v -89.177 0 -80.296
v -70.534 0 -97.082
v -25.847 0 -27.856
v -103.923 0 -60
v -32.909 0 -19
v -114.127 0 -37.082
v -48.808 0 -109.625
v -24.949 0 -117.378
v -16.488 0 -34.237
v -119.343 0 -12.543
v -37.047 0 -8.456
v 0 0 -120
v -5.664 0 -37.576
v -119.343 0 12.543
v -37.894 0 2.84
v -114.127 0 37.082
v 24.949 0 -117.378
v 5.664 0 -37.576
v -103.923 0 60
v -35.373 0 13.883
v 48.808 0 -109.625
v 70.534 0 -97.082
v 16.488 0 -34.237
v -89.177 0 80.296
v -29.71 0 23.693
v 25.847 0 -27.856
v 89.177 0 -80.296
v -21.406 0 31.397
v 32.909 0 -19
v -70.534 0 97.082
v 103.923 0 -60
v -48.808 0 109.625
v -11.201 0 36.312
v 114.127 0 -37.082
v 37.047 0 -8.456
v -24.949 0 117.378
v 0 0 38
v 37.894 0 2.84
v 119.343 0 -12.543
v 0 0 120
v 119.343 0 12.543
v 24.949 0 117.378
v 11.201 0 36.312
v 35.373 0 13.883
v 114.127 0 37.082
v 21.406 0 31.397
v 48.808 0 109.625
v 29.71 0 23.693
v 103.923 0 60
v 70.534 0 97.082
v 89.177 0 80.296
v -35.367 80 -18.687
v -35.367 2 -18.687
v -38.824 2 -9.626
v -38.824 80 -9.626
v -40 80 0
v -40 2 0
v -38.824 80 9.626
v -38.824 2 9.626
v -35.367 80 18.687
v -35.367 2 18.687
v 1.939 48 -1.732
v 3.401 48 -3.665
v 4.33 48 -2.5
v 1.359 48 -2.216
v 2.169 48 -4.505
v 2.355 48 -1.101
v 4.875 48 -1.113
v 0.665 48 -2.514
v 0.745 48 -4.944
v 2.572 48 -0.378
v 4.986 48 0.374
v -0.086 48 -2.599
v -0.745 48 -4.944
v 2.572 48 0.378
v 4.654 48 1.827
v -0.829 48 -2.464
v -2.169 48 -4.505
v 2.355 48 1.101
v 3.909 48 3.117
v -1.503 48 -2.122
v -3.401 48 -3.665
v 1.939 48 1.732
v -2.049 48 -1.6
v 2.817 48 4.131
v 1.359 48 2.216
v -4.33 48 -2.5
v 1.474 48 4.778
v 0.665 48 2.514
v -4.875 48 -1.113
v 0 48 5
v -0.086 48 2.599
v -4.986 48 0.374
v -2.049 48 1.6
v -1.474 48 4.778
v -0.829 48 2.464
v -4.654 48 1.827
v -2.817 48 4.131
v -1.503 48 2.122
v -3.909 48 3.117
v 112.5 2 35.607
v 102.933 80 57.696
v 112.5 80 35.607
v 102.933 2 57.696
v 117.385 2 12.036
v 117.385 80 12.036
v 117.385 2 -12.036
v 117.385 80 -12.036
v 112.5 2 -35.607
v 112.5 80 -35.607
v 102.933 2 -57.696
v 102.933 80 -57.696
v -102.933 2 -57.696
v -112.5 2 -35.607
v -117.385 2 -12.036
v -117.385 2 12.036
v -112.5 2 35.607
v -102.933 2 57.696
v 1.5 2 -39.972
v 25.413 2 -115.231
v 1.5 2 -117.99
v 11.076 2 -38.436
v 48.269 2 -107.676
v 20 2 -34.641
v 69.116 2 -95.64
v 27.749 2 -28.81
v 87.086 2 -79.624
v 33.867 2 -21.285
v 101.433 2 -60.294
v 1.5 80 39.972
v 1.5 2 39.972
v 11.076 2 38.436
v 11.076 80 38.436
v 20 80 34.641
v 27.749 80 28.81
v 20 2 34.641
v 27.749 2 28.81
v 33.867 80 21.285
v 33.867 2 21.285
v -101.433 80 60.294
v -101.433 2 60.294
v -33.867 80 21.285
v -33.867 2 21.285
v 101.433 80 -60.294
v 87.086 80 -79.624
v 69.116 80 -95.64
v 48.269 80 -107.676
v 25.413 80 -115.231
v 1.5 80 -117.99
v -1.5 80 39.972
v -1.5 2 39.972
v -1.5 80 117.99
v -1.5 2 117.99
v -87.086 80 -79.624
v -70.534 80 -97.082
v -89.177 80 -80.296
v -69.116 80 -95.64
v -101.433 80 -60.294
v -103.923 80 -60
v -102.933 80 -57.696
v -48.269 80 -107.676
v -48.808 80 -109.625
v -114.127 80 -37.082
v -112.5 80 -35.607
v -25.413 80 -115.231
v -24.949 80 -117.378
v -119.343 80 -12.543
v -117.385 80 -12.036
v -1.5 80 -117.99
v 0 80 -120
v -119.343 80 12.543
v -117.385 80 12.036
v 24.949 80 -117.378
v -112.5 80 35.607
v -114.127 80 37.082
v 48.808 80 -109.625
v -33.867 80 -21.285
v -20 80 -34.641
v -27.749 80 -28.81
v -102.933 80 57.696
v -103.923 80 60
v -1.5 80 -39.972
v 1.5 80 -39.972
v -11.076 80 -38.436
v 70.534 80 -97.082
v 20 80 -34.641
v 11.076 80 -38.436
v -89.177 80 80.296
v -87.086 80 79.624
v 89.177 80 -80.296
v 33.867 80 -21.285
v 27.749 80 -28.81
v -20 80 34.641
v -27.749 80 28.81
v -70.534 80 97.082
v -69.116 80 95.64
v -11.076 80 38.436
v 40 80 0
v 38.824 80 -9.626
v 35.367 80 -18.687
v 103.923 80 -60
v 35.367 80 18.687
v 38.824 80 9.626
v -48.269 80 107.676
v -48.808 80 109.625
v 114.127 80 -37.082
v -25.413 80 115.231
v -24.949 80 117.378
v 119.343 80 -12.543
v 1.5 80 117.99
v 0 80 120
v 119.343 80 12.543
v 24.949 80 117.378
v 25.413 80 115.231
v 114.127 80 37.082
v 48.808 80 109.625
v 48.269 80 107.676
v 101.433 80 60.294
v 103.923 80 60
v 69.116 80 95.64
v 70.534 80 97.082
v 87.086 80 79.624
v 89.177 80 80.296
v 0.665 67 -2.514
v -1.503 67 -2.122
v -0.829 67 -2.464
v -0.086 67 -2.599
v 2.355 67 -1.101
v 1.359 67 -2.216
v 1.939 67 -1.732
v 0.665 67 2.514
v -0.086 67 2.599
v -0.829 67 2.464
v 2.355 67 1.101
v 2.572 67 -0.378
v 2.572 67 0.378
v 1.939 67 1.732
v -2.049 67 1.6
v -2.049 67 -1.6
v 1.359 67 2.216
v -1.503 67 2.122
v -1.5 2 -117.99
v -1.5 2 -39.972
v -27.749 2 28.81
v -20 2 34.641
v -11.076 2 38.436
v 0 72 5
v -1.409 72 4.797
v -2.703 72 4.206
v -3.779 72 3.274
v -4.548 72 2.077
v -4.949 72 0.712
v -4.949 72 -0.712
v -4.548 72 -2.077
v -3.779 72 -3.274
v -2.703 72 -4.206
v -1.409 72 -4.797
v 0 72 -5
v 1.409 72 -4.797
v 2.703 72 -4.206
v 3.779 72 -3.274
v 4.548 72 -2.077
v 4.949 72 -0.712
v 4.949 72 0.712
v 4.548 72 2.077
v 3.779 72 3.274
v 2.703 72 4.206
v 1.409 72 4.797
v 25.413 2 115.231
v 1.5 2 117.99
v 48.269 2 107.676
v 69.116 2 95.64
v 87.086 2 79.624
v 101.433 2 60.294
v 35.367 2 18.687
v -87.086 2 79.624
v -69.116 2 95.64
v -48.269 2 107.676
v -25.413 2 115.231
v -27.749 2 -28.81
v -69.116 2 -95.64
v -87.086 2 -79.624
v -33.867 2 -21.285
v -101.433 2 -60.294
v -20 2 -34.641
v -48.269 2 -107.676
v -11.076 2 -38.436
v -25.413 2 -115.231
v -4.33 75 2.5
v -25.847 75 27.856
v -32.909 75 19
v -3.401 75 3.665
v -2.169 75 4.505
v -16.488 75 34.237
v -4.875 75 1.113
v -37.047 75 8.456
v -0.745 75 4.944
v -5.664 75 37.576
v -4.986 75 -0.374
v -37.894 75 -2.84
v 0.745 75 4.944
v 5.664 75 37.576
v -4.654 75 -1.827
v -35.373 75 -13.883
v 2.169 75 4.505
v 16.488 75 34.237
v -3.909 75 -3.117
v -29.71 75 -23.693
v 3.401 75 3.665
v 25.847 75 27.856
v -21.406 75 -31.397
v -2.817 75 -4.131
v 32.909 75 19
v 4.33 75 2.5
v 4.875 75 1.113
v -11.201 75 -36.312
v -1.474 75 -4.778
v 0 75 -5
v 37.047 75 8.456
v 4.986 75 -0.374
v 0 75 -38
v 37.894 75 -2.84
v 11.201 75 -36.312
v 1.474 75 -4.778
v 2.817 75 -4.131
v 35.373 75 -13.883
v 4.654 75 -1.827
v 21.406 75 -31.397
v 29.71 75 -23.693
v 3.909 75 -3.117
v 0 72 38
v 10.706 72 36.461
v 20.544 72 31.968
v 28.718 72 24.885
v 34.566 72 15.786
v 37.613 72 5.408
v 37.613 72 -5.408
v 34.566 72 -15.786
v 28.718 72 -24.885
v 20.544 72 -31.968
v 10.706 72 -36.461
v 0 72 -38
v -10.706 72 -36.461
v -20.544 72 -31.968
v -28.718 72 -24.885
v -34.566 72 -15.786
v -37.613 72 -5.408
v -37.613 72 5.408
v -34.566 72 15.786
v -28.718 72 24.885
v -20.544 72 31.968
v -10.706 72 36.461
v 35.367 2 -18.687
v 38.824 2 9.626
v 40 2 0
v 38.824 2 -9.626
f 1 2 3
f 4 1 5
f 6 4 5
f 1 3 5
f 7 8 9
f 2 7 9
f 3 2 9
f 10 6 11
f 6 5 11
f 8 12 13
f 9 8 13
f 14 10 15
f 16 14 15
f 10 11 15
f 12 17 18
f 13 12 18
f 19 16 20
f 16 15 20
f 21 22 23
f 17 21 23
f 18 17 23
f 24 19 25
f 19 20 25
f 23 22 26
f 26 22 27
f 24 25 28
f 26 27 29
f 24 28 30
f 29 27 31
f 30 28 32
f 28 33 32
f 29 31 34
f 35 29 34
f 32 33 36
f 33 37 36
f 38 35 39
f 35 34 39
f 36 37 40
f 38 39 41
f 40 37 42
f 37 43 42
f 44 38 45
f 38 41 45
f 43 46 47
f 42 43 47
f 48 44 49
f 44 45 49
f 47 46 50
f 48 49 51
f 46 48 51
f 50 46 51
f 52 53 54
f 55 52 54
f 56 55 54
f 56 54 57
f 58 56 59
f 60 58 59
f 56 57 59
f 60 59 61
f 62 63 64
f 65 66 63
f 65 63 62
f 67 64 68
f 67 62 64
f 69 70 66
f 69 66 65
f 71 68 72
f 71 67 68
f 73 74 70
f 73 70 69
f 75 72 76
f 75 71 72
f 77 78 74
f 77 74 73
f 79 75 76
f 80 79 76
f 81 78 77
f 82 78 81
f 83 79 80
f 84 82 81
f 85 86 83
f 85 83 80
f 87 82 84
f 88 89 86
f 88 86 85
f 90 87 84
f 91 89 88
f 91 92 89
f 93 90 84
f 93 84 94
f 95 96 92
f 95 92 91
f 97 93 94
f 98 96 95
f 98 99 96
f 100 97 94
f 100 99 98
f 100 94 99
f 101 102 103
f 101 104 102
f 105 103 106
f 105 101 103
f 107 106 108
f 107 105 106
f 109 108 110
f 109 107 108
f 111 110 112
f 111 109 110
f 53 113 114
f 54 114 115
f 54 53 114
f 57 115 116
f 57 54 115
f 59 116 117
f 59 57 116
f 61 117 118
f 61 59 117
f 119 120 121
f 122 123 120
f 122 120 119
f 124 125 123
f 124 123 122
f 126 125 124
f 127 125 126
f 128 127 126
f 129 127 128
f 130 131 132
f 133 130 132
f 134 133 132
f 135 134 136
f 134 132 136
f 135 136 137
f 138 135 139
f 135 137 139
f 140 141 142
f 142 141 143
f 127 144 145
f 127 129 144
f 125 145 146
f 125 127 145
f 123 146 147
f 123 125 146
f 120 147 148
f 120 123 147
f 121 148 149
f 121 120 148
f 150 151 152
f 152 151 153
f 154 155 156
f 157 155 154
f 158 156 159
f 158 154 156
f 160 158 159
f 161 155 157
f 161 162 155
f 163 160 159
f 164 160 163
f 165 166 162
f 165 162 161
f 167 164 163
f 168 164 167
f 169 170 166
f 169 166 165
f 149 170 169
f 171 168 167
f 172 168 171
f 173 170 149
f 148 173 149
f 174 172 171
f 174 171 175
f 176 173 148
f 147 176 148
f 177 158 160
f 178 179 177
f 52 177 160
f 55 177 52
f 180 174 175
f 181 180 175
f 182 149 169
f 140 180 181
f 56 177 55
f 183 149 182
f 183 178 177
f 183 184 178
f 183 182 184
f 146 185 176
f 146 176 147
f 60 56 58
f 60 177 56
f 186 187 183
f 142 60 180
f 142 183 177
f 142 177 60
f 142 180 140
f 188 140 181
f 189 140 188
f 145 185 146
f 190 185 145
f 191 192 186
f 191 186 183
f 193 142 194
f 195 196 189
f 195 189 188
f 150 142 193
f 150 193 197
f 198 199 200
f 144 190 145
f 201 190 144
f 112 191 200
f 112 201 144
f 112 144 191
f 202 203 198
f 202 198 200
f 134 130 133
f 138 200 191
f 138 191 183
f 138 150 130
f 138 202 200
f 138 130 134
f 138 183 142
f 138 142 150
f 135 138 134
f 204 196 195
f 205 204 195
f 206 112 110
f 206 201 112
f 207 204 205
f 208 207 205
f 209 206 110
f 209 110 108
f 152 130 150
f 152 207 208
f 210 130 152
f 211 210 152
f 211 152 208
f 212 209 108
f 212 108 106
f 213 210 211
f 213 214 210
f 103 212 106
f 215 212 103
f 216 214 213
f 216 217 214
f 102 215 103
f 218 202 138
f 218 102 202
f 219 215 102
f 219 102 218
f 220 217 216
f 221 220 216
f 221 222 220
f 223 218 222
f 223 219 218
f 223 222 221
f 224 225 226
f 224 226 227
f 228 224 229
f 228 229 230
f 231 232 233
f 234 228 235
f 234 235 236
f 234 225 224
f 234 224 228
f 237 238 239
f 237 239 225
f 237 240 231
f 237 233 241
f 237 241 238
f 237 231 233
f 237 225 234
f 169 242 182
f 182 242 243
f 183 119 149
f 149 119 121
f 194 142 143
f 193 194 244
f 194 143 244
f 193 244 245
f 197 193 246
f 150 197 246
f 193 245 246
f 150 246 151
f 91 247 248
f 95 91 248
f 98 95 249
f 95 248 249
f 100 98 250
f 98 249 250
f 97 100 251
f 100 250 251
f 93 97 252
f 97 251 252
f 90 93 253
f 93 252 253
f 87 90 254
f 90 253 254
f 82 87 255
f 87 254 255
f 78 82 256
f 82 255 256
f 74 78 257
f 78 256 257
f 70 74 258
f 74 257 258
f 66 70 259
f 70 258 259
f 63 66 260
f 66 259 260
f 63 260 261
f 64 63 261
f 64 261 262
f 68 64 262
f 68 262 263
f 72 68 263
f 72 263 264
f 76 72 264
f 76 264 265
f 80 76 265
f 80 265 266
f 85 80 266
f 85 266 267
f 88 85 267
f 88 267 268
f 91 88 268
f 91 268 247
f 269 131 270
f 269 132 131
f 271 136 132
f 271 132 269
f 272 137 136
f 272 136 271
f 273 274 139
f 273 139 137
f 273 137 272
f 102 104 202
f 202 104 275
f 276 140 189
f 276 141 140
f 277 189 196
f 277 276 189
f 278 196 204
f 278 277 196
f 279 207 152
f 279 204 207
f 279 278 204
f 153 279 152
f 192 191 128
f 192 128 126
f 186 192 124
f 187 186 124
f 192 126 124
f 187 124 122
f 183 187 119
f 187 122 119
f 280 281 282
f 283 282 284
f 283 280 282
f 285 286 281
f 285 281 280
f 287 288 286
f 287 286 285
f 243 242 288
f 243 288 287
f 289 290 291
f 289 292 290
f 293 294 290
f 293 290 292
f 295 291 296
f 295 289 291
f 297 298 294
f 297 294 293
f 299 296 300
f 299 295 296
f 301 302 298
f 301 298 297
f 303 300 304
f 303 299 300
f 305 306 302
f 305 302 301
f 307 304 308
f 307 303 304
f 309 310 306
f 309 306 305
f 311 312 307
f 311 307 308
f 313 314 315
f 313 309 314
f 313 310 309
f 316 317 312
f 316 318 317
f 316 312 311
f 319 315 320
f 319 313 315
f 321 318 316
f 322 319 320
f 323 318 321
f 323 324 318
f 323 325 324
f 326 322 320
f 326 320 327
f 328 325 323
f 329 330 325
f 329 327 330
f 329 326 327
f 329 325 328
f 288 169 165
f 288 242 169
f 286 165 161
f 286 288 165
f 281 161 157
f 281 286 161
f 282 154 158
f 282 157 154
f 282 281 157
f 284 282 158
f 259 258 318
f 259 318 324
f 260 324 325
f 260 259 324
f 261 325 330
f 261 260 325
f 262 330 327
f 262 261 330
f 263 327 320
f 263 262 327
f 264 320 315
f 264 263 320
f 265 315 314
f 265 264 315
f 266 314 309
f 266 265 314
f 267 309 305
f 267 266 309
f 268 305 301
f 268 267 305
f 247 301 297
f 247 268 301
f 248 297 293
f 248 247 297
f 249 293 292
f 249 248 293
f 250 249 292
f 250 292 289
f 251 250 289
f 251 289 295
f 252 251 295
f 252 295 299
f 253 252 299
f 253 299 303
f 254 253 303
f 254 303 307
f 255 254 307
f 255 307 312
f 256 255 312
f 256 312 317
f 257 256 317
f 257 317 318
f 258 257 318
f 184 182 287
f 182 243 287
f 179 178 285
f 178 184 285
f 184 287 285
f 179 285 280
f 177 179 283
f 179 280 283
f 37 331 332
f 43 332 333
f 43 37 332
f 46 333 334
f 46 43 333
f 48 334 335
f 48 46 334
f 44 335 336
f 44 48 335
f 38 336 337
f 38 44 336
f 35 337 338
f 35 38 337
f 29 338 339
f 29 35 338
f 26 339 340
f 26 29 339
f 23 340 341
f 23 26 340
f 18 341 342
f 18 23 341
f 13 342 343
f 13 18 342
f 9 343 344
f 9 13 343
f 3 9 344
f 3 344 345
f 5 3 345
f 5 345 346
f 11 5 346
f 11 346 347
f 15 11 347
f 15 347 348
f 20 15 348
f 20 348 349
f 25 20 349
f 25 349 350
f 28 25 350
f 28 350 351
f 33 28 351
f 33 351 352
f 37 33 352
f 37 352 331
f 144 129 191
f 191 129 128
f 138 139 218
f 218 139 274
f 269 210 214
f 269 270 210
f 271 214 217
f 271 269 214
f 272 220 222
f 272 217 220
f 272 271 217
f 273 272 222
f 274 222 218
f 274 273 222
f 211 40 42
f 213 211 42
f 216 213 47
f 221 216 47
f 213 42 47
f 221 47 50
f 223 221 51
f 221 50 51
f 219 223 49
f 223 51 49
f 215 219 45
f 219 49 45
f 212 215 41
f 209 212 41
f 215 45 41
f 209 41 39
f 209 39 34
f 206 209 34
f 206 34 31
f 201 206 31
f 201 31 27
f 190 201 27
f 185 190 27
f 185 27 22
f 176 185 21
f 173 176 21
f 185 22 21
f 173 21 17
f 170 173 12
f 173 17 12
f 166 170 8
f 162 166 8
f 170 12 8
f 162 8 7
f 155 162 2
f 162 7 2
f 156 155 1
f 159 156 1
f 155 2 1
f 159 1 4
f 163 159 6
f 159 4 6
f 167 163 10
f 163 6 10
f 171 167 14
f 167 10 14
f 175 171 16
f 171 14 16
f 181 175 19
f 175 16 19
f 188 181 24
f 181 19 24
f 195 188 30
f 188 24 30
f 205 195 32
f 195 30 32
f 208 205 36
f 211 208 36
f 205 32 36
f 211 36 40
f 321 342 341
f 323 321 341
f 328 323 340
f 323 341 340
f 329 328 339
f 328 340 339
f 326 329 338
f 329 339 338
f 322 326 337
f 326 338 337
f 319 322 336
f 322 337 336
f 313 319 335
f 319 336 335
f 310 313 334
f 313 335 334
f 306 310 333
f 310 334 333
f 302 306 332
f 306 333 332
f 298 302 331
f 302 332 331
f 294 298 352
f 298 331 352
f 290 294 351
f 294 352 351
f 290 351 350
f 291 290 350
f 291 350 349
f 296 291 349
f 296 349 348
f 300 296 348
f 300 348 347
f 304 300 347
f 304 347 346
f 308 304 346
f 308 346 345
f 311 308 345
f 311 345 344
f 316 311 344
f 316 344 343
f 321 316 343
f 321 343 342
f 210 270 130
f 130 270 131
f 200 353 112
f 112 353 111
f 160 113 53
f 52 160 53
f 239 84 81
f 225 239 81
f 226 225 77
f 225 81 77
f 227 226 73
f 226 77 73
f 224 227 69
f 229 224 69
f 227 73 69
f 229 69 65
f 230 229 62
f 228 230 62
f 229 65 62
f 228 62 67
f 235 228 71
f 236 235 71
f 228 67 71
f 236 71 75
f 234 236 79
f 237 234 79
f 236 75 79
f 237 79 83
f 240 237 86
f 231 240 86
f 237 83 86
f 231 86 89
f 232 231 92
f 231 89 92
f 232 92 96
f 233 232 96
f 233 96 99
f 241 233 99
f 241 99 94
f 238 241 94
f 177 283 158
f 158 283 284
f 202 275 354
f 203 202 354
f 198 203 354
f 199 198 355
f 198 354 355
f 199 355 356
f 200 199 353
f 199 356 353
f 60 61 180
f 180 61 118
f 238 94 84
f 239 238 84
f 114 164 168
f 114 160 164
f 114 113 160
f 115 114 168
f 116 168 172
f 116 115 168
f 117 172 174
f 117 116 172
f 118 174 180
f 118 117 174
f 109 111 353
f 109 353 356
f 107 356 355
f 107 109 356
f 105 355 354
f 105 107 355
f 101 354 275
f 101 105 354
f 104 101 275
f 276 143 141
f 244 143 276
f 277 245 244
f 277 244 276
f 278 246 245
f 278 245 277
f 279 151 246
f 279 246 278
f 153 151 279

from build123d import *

# Parameters (mm, degrees)
SKETCH_1_R               = 120
SKETCH_1_R_2             = 38
EXTRUDE_1_DEPTH          = 80
SHELL_1_T                = -2
EXTRUDE_START            = -78
EXTRUDE_2_DEPTH          = 78
PATTERN_CIRCULAR_1_COUNT = 6
EXTRUDE_START_2          = -8
SKETCH_3_R               = 38
EXTRUDE_3_DEPTH          = 8
SKETCH_4_R               = 5
EXTRUDE_4_DEPTH          = 24
CUT_EXTRUDE_1_DEPTH      = 19
SKETCH_6_R               = 38
SKETCH_6_R_2             = 5
CUT_EXTRUDE_2_DEPTH      = 3


with BuildPart() as part:
    # 草图1 → 凸台-拉伸1 (new body)
    with BuildSketch(Plane(origin=(0, 0, 0), x_dir=(1, 0, 0), z_dir=(0, 1, 0))):
        with Locations(Location((0, 0, 0), (0, 0, 270))):
            Circle(SKETCH_1_R)
        with Locations(Location((0, 0, 0), (0, 0, 270))):
            Circle(SKETCH_1_R_2, mode=Mode.SUBTRACT)
    extrude(amount=EXTRUDE_1_DEPTH)

    # 抽壳1
    shell_1_openings = [part.faces().sort_by_distance(p)[0] for p in [
        (0, 80, -116.60588745),
    ]]
    offset(amount=SHELL_1_T, openings=shell_1_openings, kind=Kind.INTERSECTION)

    # 草图2 → 凸台-拉伸2 (add)
    with BuildSketch(Plane(origin=(0, 80, 0), x_dir=(1, 0, 0), z_dir=(0, 1, 0)).offset(EXTRUDE_START)):
        with BuildLine():
            Line((-1.5, 117.990465717), (-1.5, 39.971865105))
            ThreePointArc((-1.5, 39.971865105), (0, 40), (1.5, 39.971865105))
            Line((1.5, 39.971865105), (1.5, 117.990465717))
            ThreePointArc((1.5, 117.990465717), (0, 118), (-1.5, 117.990465717))
        make_face()
    extrude_2 = extrude(amount=EXTRUDE_2_DEPTH)

    # 阵列(圆周)1: 凸台-拉伸2 ×6 about axis
    pattern_circular_1_axis = Axis((0, 0, 0), (0, 1, 0))
    for i in range(1, PATTERN_CIRCULAR_1_COUNT):
        add(extrude_2.rotate(pattern_circular_1_axis, i * 360 / PATTERN_CIRCULAR_1_COUNT))

    # 草图3 → 凸台-拉伸3 (add)
    with BuildSketch(Plane(origin=(0, 80, 0), x_dir=(1, 0, 0), z_dir=(0, 1, 0)).offset(EXTRUDE_START_2)):
        with Locations(Location((0, 0, 0), (0, 0, 270))):
            Circle(SKETCH_3_R)
    extrude(amount=EXTRUDE_3_DEPTH)

    # 草图4 → 凸台-拉伸4 (add)
    with BuildSketch(Plane.XZ.offset(-72)):
        with Locations(Location((0, 0, 0), (0, 0, 90))):
            Circle(SKETCH_4_R)
    extrude(amount=EXTRUDE_4_DEPTH)

    # 草图5 → 切除-拉伸1 (cut)
    with BuildSketch(Plane.XZ.offset(-48)):
        with BuildLine():
            Line((-2.049390153, 1.6), (-2.049390153, -1.6))
            ThreePointArc((-2.049390153, -1.6), (2.6, 0), (-2.049390153, 1.6))
        make_face()
    extrude(amount=-CUT_EXTRUDE_1_DEPTH, mode=Mode.SUBTRACT)

    # 草图6 → 切除-拉伸2 (cut)
    with BuildSketch(Plane.XZ.offset(-72)):
        with Locations(Location((0, 0, 0), (0, 0, 270))):
            Circle(SKETCH_6_R)
        with Locations(Location((0, 0, 0), (0, 0, 270))):
            Circle(SKETCH_6_R_2, mode=Mode.SUBTRACT)
    extrude(amount=-CUT_EXTRUDE_2_DEPTH, mode=Mode.SUBTRACT)


solid = part.part
